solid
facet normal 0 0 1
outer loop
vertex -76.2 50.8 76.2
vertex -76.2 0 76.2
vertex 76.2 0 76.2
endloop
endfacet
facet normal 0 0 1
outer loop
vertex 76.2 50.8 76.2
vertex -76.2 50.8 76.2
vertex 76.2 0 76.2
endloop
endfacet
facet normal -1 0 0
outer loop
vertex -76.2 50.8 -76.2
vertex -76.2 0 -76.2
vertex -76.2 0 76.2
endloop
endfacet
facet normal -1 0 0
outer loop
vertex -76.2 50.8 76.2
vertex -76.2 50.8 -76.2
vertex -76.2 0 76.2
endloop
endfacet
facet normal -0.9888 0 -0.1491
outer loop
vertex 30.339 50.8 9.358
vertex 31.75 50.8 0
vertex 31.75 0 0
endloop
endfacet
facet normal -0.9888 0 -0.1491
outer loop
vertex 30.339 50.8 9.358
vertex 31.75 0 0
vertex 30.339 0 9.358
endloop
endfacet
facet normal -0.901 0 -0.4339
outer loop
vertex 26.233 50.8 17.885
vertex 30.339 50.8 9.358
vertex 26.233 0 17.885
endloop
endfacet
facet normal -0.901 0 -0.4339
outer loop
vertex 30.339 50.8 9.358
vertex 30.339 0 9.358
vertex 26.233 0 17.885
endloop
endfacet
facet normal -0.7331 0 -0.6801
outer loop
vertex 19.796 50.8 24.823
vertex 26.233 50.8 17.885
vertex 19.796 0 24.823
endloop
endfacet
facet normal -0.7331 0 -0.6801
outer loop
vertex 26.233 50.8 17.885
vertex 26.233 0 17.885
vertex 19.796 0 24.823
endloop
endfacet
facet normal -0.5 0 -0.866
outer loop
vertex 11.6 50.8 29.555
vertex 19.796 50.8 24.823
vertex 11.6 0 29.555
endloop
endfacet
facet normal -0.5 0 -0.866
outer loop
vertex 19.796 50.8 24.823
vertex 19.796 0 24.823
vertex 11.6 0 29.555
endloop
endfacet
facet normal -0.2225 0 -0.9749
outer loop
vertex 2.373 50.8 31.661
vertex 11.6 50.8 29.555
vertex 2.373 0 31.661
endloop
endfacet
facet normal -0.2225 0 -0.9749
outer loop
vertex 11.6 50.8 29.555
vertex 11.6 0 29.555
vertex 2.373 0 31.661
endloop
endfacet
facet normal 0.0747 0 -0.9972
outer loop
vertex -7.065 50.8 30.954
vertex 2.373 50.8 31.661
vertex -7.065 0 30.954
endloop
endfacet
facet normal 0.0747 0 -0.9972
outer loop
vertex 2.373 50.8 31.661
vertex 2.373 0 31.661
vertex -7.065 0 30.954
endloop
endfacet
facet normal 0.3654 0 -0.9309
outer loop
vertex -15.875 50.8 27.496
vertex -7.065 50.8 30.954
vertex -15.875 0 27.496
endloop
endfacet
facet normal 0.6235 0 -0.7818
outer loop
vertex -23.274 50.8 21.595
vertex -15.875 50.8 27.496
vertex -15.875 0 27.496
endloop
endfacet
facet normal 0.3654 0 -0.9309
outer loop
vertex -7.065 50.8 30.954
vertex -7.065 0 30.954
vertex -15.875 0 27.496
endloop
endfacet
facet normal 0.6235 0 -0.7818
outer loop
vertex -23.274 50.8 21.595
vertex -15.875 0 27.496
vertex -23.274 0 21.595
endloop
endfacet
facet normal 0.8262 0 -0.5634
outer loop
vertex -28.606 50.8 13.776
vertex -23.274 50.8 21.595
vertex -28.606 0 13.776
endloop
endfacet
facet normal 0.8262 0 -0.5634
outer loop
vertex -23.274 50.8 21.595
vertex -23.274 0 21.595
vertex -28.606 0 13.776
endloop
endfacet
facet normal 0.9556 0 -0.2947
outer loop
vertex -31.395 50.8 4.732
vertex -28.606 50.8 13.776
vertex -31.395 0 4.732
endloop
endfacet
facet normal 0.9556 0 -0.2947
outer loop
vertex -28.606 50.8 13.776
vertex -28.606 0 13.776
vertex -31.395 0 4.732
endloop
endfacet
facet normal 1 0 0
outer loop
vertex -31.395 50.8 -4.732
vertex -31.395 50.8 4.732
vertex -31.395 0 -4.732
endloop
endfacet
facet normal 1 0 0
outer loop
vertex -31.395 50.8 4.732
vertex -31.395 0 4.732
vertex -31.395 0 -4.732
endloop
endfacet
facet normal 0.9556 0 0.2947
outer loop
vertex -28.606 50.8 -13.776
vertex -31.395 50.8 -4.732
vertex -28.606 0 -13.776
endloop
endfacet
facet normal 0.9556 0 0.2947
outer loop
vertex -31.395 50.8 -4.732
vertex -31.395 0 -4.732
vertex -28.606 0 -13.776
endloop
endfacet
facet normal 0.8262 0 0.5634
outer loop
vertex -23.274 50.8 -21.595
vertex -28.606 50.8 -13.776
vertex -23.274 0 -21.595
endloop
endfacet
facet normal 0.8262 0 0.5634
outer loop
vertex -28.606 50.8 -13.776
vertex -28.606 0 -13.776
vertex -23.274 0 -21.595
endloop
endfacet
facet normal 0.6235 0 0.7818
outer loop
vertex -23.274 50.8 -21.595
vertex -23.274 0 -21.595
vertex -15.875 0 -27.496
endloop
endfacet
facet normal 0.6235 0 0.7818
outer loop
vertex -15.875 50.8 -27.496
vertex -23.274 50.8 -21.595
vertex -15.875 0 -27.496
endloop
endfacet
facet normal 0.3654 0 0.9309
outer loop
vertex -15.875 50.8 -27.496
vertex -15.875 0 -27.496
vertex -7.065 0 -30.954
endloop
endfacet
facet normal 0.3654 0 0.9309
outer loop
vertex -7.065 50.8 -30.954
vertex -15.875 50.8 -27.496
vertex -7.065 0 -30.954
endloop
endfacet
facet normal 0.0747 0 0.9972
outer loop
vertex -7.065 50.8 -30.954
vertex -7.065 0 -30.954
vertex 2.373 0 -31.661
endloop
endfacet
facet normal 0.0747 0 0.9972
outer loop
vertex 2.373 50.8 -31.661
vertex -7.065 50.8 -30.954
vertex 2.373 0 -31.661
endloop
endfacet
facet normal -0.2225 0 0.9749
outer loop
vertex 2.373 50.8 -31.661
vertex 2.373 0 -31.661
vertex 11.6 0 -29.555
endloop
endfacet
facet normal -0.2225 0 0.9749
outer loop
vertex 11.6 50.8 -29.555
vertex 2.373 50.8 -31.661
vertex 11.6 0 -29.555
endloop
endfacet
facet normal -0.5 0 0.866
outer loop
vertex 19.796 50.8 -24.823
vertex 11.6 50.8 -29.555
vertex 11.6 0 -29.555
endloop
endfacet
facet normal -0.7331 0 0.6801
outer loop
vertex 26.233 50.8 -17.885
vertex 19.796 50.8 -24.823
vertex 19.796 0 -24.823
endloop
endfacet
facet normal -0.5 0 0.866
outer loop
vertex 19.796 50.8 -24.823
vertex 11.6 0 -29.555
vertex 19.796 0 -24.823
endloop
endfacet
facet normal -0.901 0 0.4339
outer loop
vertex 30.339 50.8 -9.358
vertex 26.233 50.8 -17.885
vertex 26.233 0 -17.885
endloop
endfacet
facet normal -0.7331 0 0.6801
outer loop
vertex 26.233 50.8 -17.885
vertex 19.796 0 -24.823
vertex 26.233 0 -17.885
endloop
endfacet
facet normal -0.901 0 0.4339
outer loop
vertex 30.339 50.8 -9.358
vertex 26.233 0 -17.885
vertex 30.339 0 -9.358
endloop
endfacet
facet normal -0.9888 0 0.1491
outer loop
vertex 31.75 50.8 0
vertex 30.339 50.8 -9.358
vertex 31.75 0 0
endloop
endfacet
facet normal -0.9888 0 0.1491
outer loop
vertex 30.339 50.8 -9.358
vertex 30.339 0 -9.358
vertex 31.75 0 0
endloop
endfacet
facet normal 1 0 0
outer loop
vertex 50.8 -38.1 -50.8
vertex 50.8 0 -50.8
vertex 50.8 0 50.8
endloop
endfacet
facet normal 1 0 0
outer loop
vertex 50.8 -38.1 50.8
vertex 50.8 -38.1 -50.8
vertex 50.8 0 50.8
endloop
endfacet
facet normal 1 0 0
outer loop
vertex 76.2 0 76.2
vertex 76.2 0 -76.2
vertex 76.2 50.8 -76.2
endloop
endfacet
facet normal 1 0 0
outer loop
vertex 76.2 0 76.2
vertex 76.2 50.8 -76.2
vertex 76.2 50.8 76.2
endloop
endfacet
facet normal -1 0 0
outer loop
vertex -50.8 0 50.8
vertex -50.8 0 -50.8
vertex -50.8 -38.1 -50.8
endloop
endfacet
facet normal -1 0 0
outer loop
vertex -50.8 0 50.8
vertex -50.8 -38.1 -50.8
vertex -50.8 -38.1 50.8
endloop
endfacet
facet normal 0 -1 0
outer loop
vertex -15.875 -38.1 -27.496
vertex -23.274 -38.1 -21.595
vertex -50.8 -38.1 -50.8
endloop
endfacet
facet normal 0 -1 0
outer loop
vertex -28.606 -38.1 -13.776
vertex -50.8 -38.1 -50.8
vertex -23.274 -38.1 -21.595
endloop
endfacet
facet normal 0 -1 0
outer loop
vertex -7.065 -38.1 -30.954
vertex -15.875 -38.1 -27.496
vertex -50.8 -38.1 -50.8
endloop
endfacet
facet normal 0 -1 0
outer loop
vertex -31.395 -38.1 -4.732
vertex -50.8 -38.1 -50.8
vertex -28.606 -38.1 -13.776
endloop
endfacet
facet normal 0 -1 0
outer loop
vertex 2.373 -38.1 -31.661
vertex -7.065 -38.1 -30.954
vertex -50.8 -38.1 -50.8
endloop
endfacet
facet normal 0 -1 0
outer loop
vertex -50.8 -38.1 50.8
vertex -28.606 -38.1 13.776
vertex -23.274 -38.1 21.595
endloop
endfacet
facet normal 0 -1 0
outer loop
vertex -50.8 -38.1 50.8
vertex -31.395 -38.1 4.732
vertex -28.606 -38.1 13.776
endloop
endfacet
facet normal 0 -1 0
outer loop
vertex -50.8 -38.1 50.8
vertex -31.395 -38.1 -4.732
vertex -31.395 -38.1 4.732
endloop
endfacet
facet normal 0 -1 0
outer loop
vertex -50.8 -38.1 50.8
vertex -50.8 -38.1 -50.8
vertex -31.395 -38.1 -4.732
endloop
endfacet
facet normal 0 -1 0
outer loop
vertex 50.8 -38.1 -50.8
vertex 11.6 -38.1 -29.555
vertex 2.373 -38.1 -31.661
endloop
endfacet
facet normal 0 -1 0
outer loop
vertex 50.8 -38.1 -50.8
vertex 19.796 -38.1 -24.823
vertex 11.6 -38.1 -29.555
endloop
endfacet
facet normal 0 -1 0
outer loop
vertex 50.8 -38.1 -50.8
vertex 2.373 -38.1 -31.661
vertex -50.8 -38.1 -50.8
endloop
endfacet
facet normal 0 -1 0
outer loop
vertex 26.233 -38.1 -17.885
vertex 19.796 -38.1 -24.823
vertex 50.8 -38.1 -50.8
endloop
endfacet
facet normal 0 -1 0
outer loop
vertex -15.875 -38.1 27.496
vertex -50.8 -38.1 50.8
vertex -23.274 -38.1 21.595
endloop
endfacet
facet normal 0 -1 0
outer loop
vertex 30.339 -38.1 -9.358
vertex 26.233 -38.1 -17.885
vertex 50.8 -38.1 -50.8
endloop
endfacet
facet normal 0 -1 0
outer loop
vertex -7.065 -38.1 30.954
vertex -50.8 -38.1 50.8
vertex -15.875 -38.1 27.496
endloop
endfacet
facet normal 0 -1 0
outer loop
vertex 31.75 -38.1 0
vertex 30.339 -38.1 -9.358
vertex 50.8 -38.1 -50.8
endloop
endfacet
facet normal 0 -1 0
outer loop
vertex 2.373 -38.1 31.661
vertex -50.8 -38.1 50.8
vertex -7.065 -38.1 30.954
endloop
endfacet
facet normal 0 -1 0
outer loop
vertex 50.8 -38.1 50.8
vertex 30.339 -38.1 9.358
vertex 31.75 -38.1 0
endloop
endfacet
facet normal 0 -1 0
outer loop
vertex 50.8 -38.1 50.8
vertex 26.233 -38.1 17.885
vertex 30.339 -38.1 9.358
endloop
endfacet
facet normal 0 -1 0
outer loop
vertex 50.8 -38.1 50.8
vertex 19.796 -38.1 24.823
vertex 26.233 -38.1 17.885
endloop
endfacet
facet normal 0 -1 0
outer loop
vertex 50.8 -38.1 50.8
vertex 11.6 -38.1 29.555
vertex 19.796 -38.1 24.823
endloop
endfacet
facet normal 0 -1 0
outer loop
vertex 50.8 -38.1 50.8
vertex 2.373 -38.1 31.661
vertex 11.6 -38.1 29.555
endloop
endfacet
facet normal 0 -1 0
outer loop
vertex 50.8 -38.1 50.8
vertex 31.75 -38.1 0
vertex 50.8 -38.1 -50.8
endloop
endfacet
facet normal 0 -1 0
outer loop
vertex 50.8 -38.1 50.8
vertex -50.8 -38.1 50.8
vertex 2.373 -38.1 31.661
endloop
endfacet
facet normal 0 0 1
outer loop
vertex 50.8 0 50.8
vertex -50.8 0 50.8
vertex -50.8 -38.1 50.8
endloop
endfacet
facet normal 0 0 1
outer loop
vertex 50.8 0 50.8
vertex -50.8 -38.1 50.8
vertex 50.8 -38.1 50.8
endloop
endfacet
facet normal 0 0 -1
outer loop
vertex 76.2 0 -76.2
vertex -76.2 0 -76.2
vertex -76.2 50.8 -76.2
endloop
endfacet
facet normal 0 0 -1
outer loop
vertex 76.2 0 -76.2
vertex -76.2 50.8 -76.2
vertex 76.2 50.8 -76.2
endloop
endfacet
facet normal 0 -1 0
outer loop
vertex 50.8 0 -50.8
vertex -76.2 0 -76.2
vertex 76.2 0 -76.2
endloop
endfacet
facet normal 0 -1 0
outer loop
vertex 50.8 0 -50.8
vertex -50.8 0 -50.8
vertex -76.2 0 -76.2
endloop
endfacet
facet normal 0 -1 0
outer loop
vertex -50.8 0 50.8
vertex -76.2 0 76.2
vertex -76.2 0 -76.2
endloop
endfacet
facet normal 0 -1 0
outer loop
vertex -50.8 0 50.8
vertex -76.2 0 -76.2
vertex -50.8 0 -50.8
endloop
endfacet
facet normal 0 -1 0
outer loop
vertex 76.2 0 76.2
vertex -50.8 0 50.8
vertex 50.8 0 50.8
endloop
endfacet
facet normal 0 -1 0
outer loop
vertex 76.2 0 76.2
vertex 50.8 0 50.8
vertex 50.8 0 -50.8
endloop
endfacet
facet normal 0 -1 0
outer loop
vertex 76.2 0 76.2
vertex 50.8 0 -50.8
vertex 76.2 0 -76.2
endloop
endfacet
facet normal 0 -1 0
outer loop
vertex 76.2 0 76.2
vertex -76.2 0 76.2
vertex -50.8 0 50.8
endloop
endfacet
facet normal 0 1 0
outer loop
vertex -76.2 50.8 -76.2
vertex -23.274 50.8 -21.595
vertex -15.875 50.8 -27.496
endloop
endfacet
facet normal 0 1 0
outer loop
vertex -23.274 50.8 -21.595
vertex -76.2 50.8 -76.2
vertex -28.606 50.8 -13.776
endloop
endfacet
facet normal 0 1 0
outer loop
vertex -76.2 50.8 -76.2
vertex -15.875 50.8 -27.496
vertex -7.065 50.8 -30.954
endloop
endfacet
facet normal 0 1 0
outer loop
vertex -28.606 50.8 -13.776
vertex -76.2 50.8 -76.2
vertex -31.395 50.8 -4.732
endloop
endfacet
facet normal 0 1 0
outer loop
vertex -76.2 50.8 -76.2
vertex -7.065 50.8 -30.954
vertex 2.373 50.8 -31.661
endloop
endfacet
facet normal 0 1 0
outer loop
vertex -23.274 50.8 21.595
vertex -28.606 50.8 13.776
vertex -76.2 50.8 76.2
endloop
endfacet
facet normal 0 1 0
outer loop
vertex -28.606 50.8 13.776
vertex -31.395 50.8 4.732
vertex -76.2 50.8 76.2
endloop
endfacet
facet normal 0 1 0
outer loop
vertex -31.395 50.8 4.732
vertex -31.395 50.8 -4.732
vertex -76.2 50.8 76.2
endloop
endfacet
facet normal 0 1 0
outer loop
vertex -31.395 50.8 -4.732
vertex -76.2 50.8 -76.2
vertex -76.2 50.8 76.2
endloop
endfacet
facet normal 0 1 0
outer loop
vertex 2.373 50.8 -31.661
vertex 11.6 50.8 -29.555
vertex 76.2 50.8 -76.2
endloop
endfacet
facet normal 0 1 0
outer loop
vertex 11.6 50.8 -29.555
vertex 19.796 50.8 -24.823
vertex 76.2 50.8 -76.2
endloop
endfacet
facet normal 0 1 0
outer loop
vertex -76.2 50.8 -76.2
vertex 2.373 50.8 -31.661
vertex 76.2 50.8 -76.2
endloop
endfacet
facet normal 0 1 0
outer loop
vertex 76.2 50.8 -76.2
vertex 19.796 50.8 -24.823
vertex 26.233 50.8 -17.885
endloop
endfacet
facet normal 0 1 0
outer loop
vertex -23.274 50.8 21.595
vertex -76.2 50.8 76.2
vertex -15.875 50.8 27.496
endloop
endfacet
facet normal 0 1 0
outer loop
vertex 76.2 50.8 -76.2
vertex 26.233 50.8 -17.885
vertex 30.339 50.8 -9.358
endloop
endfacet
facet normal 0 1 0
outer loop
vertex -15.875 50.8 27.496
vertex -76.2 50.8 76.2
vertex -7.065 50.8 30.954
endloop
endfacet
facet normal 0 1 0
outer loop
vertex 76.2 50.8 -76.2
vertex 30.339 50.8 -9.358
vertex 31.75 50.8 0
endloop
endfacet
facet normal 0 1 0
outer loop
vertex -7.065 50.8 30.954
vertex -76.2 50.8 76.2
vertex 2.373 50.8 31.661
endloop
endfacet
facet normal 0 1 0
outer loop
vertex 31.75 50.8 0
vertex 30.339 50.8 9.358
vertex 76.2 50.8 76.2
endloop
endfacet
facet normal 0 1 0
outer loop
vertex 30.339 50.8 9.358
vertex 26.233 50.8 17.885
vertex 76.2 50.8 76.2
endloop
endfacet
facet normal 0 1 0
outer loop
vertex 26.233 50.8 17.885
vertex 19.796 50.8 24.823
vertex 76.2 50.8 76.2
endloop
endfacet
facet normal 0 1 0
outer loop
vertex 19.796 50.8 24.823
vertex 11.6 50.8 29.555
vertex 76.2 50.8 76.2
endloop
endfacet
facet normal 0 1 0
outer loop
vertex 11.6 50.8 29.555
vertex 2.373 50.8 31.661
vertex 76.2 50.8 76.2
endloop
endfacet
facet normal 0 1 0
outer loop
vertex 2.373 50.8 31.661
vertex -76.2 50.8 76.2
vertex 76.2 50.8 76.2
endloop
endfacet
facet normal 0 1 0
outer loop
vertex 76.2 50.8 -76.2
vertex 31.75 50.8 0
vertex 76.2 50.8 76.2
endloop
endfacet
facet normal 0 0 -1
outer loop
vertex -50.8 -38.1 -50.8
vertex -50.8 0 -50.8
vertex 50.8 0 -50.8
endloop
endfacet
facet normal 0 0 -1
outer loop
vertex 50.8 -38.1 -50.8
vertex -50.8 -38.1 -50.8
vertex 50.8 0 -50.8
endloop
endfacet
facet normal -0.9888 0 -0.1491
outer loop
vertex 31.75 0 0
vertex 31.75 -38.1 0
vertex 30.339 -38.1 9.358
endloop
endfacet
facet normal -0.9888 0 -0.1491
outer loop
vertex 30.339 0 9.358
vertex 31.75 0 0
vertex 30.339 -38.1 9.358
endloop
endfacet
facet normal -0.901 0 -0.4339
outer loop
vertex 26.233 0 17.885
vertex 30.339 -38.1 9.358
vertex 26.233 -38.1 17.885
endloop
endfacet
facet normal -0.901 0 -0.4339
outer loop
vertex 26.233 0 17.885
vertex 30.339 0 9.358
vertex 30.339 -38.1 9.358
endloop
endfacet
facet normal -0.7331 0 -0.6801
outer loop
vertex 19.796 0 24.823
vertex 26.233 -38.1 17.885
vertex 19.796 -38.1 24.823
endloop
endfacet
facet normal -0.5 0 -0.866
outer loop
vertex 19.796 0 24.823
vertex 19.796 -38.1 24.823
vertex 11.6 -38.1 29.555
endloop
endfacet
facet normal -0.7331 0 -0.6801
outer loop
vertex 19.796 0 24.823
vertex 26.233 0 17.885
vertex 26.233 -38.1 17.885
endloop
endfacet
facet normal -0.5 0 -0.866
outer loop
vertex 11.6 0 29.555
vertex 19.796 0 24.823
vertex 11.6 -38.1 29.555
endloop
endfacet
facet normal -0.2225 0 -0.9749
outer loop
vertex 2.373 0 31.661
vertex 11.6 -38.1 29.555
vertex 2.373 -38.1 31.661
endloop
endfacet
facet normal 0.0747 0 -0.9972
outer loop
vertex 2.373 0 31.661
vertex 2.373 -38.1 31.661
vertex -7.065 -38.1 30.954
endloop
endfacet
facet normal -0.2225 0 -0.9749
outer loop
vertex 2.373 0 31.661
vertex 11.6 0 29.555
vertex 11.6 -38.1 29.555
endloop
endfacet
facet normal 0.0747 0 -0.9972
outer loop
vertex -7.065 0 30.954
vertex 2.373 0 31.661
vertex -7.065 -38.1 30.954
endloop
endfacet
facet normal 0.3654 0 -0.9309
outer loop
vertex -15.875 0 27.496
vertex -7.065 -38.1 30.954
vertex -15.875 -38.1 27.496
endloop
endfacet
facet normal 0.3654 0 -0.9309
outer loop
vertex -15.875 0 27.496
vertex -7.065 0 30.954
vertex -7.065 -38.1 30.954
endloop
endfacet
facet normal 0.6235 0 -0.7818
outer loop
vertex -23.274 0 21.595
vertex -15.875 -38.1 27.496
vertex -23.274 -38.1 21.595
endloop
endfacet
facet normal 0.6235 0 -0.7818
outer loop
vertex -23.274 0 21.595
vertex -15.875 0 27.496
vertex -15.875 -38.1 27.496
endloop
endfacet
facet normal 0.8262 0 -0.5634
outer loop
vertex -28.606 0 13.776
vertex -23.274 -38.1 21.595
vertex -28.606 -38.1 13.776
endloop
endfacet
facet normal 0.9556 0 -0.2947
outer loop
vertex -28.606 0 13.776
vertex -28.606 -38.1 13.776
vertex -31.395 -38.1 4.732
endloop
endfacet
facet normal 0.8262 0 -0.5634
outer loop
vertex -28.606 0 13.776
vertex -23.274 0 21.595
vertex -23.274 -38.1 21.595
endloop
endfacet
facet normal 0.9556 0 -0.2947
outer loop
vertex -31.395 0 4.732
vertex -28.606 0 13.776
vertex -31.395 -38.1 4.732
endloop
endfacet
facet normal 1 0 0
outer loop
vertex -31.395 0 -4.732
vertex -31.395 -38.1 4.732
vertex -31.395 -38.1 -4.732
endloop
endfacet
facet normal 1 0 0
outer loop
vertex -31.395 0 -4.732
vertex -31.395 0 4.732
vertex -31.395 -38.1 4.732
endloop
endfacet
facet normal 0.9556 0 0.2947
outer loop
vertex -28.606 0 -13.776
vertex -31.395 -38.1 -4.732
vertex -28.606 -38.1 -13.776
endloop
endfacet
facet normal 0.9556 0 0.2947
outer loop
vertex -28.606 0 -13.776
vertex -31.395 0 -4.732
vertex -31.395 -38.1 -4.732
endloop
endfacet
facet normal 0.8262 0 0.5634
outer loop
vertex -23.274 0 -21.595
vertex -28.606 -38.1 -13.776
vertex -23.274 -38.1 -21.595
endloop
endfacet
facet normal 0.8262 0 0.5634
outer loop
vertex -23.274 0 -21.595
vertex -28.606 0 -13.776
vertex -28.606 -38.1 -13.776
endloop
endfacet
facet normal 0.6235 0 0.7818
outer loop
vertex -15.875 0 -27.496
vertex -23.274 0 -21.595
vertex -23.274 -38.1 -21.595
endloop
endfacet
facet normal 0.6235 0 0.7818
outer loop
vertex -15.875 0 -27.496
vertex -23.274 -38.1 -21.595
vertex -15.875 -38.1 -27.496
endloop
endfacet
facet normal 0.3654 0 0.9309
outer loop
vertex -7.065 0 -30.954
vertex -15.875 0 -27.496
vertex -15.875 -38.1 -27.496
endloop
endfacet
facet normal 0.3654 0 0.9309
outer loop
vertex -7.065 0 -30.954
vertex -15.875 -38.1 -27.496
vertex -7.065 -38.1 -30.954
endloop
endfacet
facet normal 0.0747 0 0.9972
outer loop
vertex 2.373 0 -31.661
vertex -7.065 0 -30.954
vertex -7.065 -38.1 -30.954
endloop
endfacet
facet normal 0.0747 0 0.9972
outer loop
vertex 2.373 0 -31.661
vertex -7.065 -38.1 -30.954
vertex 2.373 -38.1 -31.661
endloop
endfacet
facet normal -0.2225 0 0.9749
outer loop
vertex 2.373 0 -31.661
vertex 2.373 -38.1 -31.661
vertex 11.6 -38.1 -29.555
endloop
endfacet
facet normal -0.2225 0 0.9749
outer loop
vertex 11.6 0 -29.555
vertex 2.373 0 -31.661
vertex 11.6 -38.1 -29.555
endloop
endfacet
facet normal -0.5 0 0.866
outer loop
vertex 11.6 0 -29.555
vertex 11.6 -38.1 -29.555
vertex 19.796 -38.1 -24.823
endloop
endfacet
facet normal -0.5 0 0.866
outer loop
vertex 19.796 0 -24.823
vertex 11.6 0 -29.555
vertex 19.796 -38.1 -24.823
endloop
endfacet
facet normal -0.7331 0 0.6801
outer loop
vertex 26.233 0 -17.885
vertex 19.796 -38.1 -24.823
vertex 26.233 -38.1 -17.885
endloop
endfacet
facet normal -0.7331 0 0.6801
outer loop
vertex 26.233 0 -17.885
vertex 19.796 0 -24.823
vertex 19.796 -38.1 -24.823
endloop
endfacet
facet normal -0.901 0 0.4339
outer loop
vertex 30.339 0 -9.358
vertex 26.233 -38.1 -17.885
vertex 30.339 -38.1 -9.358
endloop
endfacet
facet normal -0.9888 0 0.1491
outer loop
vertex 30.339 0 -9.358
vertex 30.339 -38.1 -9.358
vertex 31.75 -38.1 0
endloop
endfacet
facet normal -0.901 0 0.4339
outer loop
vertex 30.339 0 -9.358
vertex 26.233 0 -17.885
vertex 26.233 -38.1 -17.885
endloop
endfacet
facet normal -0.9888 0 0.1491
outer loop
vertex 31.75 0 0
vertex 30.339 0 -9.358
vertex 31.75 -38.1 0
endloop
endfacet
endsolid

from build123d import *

# Parameters (mm, degrees)
F0_W     = 101.6
F0_H     = 101.6
F0_R     = 31.75
F1_DEPTH = 38.1
F0_W_2   = 152.4
F0_H_2   = 152.4
F2_DEPTH = 50.8


with BuildPart() as f1:
    # F0 (on Front) → F1 (new body)
    with BuildSketch(Plane.XZ):
        Rectangle(F0_W, F0_H)
        Circle(F0_R, mode=Mode.SUBTRACT)
    extrude(amount=F1_DEPTH)

    # F0 (on Front) → F2 (join)
    with BuildSketch(Plane.XZ):
        Rectangle(F0_W_2, F0_H_2)
        Rectangle(F0_W, F0_H, mode=Mode.SUBTRACT)
        Rectangle(F0_W, F0_H)
        Circle(F0_R, mode=Mode.SUBTRACT)
    extrude(amount=-F2_DEPTH)


solid = f1.part
